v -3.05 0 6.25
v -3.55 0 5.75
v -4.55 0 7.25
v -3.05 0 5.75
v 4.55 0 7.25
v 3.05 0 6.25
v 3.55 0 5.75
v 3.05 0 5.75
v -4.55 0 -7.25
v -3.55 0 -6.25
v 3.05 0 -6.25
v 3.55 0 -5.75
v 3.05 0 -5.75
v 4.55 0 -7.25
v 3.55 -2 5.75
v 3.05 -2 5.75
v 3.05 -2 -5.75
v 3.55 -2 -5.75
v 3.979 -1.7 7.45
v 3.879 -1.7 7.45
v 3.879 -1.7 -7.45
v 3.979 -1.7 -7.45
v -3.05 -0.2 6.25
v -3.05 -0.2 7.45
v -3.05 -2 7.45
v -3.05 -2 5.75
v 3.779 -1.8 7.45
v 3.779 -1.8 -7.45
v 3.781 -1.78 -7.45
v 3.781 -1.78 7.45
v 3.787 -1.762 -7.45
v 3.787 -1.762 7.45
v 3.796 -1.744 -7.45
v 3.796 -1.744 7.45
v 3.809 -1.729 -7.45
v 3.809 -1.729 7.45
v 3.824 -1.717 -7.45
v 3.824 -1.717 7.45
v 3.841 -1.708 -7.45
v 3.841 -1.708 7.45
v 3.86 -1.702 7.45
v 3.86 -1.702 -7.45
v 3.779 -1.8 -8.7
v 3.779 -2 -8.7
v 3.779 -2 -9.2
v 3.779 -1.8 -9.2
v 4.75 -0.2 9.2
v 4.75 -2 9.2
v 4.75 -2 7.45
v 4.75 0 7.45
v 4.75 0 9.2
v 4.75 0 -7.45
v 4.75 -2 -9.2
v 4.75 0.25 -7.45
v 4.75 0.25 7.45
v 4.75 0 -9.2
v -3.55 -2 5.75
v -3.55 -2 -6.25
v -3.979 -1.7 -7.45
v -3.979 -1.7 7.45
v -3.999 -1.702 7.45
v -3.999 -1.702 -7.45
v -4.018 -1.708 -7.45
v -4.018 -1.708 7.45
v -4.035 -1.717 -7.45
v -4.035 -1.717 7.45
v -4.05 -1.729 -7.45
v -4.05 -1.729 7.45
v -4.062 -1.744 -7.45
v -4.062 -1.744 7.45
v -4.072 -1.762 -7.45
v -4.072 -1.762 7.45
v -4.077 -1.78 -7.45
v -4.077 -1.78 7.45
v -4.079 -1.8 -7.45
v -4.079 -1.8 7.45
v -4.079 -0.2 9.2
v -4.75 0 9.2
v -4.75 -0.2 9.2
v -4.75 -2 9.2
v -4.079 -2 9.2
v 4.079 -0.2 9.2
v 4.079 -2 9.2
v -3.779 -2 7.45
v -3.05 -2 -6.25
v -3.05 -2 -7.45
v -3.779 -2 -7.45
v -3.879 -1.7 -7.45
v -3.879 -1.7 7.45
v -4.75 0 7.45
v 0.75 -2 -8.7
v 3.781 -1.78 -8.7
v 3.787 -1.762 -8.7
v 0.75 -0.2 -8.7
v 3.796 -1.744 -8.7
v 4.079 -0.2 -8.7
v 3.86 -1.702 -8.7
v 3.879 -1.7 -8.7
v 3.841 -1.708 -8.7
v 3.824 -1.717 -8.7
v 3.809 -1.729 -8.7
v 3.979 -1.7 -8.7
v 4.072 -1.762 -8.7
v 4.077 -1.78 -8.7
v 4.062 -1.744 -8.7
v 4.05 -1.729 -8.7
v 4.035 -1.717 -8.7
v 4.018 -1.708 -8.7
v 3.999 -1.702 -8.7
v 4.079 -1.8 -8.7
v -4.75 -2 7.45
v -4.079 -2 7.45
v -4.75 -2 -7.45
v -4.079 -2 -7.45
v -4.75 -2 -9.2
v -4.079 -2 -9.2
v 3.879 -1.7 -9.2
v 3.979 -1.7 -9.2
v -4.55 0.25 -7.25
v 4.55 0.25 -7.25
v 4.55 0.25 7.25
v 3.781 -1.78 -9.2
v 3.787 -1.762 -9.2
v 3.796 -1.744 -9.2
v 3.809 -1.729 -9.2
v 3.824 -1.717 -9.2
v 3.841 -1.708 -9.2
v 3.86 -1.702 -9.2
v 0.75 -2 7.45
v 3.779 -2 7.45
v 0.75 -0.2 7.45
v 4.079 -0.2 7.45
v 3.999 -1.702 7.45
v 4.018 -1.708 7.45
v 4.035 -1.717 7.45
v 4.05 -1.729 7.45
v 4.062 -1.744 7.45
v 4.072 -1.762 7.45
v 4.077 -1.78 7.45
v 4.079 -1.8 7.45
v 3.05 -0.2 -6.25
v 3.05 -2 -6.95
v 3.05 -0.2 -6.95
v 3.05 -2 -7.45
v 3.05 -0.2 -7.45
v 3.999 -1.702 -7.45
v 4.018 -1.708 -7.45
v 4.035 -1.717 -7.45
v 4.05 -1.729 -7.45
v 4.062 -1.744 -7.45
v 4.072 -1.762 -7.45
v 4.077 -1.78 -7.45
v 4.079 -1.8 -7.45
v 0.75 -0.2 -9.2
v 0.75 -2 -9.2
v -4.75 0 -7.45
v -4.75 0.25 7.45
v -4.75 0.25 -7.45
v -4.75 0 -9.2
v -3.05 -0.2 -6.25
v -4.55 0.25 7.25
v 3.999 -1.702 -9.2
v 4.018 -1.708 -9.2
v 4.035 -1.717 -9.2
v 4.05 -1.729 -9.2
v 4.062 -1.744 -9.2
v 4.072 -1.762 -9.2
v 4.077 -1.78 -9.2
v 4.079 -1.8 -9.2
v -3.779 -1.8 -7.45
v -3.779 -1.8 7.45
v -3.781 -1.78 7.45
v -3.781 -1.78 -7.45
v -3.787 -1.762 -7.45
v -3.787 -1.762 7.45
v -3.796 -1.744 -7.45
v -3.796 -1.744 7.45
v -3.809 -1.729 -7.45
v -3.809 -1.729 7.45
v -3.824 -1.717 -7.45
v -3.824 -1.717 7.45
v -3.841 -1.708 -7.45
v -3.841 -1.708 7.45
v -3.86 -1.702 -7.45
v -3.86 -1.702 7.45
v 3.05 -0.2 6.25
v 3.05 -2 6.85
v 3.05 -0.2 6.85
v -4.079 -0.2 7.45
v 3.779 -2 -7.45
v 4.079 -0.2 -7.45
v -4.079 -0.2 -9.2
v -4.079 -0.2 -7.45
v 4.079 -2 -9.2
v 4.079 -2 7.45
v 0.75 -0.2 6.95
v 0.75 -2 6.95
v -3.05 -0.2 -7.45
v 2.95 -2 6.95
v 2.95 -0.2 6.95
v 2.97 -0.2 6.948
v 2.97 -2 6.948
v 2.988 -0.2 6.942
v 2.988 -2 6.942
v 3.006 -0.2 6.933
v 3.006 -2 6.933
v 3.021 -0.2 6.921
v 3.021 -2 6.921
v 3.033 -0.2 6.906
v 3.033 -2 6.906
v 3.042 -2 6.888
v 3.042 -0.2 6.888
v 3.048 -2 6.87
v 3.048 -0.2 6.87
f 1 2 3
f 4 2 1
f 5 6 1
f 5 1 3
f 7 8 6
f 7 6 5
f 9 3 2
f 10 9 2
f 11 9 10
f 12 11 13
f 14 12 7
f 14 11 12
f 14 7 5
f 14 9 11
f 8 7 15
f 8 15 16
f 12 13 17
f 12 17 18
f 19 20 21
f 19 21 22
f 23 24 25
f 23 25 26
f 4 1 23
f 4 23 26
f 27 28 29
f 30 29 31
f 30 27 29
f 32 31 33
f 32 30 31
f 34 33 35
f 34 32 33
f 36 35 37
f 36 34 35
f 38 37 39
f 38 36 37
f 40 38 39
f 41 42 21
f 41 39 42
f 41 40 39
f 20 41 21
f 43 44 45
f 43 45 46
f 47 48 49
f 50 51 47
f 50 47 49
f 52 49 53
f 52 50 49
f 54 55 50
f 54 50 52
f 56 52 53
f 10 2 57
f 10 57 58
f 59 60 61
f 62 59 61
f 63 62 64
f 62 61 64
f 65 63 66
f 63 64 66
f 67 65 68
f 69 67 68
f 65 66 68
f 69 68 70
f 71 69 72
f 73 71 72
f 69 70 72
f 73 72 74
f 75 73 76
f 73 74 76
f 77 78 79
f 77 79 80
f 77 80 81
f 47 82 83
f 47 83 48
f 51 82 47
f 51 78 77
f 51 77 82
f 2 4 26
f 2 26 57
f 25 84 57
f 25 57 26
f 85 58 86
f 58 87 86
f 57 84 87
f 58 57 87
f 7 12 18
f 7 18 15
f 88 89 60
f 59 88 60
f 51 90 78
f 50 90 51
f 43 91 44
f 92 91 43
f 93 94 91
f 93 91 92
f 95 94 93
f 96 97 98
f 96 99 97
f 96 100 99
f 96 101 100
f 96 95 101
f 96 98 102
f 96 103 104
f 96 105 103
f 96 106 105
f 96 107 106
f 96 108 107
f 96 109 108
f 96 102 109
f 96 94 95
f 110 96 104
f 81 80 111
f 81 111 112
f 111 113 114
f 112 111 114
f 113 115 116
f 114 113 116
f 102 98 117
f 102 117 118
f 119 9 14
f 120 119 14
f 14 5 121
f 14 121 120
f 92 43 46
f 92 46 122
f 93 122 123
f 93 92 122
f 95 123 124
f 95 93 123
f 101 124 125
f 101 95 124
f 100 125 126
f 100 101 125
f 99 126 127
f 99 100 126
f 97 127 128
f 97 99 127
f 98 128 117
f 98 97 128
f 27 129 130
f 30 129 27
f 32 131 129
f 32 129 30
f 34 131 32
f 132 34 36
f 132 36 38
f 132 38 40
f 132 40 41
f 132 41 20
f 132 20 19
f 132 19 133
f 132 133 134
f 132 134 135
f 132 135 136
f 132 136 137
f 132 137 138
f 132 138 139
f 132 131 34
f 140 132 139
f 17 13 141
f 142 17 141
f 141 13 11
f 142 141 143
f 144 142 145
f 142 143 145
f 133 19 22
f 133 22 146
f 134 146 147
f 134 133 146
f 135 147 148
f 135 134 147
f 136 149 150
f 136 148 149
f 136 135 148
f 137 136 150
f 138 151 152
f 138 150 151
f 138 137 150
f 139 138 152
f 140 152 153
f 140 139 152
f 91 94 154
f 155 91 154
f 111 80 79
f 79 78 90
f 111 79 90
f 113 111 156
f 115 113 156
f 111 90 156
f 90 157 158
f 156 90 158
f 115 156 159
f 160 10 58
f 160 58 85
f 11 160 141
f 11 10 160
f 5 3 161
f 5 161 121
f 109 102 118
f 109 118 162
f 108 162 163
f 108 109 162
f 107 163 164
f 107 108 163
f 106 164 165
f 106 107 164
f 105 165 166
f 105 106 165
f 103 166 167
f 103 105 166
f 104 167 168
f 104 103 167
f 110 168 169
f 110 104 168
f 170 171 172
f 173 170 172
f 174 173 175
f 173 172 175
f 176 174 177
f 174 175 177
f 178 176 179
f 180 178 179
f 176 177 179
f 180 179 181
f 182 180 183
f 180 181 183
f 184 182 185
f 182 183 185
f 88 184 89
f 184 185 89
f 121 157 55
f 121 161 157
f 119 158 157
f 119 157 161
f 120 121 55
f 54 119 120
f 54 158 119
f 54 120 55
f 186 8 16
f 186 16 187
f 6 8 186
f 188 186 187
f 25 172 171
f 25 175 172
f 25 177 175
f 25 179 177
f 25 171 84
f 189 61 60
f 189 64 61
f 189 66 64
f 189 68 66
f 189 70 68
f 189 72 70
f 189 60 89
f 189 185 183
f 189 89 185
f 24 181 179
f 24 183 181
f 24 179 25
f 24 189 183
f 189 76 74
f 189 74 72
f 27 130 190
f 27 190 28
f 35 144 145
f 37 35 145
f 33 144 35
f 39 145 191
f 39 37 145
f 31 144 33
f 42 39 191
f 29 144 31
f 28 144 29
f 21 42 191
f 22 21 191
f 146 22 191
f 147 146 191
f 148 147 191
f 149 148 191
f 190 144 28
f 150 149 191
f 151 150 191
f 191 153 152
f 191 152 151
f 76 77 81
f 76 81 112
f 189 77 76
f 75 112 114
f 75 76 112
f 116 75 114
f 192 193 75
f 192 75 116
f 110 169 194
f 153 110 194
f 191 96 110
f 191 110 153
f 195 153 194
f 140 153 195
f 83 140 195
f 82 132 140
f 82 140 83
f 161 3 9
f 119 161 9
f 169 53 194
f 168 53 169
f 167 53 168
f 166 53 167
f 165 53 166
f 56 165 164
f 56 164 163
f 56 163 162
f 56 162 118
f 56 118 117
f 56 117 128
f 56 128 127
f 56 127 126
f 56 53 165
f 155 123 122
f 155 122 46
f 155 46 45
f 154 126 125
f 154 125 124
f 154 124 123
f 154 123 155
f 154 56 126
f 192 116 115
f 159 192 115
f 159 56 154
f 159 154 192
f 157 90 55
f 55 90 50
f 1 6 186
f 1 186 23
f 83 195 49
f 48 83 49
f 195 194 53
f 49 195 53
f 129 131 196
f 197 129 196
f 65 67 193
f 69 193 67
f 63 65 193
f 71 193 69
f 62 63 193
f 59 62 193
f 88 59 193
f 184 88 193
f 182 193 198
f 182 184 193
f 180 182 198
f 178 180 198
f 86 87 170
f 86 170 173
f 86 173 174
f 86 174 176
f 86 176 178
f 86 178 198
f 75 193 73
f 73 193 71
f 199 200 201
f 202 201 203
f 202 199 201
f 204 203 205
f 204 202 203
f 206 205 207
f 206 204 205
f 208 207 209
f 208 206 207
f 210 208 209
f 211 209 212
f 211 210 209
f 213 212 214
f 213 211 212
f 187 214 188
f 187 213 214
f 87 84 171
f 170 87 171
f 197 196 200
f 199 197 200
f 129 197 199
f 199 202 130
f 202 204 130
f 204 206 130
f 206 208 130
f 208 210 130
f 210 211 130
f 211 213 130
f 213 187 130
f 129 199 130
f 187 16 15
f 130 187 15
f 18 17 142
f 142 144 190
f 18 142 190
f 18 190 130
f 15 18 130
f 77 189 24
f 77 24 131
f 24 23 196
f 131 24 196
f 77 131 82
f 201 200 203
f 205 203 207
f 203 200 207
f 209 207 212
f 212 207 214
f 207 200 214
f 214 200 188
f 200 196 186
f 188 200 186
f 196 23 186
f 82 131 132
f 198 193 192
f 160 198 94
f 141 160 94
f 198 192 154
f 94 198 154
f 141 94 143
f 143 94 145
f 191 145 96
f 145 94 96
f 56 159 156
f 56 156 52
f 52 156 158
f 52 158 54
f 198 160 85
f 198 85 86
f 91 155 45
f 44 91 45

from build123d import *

# Parameters (mm, degrees)
SKETCH1_W           = 9.5
SKETCH1_H           = 16.65
BOSS_EXTRUDE1_DEPTH = 0.2
SKETCH1_3_W         = 0.5
SKETCH1_3_H         = 0.5
BOSS_EXTRUDE2_DEPTH = 2
SKETCH1_4_W         = 9.5
SKETCH1_4_H         = 14.9
SKETCH1_4_W_2       = 9.1
SKETCH1_4_H_2       = 14.5
BOSS_EXTRUDE3_DEPTH = 0.25
BOSS_EXTRUDE4_DEPTH = 2
SKETCH1_6_W         = 0.670753581
SKETCH1_6_H         = 1.75
SKETCH1_6_W_2       = 1.029246419
SKETCH1_6_H_2       = 0.5
SKETCH1_6_W_3       = 3.329246419
BOSS_EXTRUDE5_DEPTH = 2
FILLET1_R           = 0.1
BOSS_EXTRUDE6_DEPTH = 0.2
SKETCH1_10_W        = 3.329246419
SKETCH1_10_H        = 0.5
SKETCH1_10_W_2      = 0.670753581
SKETCH1_10_H_2      = 1.75
BOSS_EXTRUDE7_DEPTH = 2
CUT_EXTRUDE1_DEPTH  = 18.429429136


with BuildPart() as part:
    # Sketch1 → Boss-Extrude1 (new body)
    with BuildSketch(Plane(origin=(0, 0, 0), x_dir=(1, 0, 0), z_dir=(0, 1, 0))):
        with Locations((0, -0.875)):
            Rectangle(SKETCH1_W, SKETCH1_H)
        Polygon((-3.55, 6.25), (3.05, 6.25), (3.05, 5.75), (3.55, 5.75), (3.55, -5.75), (3.05, -5.75), (3.05, -6.25), (-3.05, -6.25), (-3.05, -5.75), (-3.55, -5.75), align=None, mode=Mode.SUBTRACT)
    extrude(amount=-BOSS_EXTRUDE1_DEPTH)

    # Sketch1_3 → Boss-Extrude2 (add)
    with BuildSketch(Plane(origin=(0, 0, 0), x_dir=(1, 0, 0), z_dir=(0, 1, 0))):
        with Locations((3.3, -6)):
            Rectangle(SKETCH1_3_W, SKETCH1_3_H)
        with Locations((3.3, 6)):
            Rectangle(SKETCH1_3_W, SKETCH1_3_H)
        with Locations((-3.3, -6)):
            Rectangle(SKETCH1_3_W, SKETCH1_3_H)
    extrude(amount=-BOSS_EXTRUDE2_DEPTH)

    # Sketch1_4 → Boss-Extrude3 (add)
    with BuildSketch(Plane(origin=(0, 0, 0), x_dir=(1, 0, 0), z_dir=(0, 1, 0))):
        Rectangle(SKETCH1_4_W, SKETCH1_4_H)
        Rectangle(SKETCH1_4_W_2, SKETCH1_4_H_2, mode=Mode.SUBTRACT)
    extrude(amount=BOSS_EXTRUDE3_DEPTH)

    # Sketch1_5 → Boss-Extrude4 (add)
    with BuildSketch(Plane(origin=(0, 0, 0), x_dir=(1, 0, 0), z_dir=(0, 1, 0))):
        Polygon((-4.75, 7.45), (-4.75, -7.45), (-3.05, -7.45), (-3.05, -6.25), (-3.55, -6.25), (-3.55, 6.25), (-3.05, 6.25), (-3.05, 7.45), align=None)
        Polygon((3.55, -6.25), (3.05, -6.25), (3.05, -6.95), (4.079246419, -6.95), (4.079246419, -7.45), (4.75, -7.45), (4.75, 7.45), (4.079246419, 7.45), (4.079246419, 6.95), (3.05, 6.95), (3.05, 6.25), (3.55, 6.25), align=None)
    extrude(amount=-BOSS_EXTRUDE4_DEPTH)

    # Sketch1_6 → Boss-Extrude5 (add)
    with BuildSketch(Plane(origin=(0, 0, 0), x_dir=(1, 0, 0), z_dir=(0, 1, 0))):
        with Locations((-4.41462321, -8.325)):
            Rectangle(SKETCH1_6_W, SKETCH1_6_H)
        with Locations((3.56462321, 7.2)):
            Rectangle(SKETCH1_6_W_2, SKETCH1_6_H_2)
        with Locations((2.41462321, -7.2)):
            Rectangle(SKETCH1_6_W_3, SKETCH1_6_H_2)
        with Locations((4.41462321, -8.325)):
            Rectangle(SKETCH1_6_W, SKETCH1_6_H)
    extrude(amount=-BOSS_EXTRUDE5_DEPTH)

    # Fillet1
    fillet1_edges = [part.edges().sort_by_distance(p)[0] for p in [
        (3.05, -1.1, 6.95),
    ]]
    fillet(fillet1_edges, radius=FILLET1_R)

    # Sketch1_9 → Boss-Extrude6 (add)
    with BuildSketch(Plane(origin=(0, 0, 0), x_dir=(1, 0, 0), z_dir=(0, 1, 0))):
        Polygon((-4.079246419, 9.2), (-4.079246419, 7.45), (-3.05, 7.45), (0, 7.45), (0.75, 7.45), (3.05, 7.45), (4.079246419, 7.45), (4.079246419, 8.7), (0.75, 8.7), (0.75, 9.2), align=None)
    extrude(amount=-BOSS_EXTRUDE6_DEPTH)

    # Sketch1_10 → Boss-Extrude7 (add)
    with BuildSketch(Plane(origin=(0, 0, 0), x_dir=(1, 0, 0), z_dir=(0, 1, 0))):
        with Locations((2.41462321, 8.95)):
            Rectangle(SKETCH1_10_W, SKETCH1_10_H)
        Polygon((4.75, 9.2), (4.079246419, 9.2), (4.079246419, 8.7), (4.079246419, 7.45), (4.75, 7.45), align=None)
        with Locations((-4.41462321, 8.325)):
            Rectangle(SKETCH1_10_W_2, SKETCH1_10_H_2)
    extrude(amount=-BOSS_EXTRUDE7_DEPTH)

    # Sketch6 → Cut-Extrude1 (cut, through all)
    with BuildSketch(Plane.XY.offset(7.45)):
        with BuildLine():
            Line((-4.079246419, -2), (-3.779246419, -2))
            Line((-3.779246419, -2), (-3.779246419, -1.8))
            ThreePointArc((-3.779246419, -1.8), (-3.808535741, -1.729289322), (-3.879246419, -1.7))
            Line((-3.879246419, -1.7), (-3.979246419, -1.7))
            ThreePointArc((-3.979246419, -1.7), (-4.049957097, -1.729289322), (-4.079246419, -1.8))
            Line((-4.079246419, -1.8), (-4.079246419, -2))
        make_face()
    cut_extrude1 = extrude(amount=-CUT_EXTRUDE1_DEPTH, mode=Mode.SUBTRACT)

    # Mirror1: Cut-Extrude1 across plane
    add(cut_extrude1.mirror(Plane(origin=(0, 0, 0), x_dir=(0, 0, 1), z_dir=(1, 0, 0))), mode=Mode.SUBTRACT)


solid = part.part
